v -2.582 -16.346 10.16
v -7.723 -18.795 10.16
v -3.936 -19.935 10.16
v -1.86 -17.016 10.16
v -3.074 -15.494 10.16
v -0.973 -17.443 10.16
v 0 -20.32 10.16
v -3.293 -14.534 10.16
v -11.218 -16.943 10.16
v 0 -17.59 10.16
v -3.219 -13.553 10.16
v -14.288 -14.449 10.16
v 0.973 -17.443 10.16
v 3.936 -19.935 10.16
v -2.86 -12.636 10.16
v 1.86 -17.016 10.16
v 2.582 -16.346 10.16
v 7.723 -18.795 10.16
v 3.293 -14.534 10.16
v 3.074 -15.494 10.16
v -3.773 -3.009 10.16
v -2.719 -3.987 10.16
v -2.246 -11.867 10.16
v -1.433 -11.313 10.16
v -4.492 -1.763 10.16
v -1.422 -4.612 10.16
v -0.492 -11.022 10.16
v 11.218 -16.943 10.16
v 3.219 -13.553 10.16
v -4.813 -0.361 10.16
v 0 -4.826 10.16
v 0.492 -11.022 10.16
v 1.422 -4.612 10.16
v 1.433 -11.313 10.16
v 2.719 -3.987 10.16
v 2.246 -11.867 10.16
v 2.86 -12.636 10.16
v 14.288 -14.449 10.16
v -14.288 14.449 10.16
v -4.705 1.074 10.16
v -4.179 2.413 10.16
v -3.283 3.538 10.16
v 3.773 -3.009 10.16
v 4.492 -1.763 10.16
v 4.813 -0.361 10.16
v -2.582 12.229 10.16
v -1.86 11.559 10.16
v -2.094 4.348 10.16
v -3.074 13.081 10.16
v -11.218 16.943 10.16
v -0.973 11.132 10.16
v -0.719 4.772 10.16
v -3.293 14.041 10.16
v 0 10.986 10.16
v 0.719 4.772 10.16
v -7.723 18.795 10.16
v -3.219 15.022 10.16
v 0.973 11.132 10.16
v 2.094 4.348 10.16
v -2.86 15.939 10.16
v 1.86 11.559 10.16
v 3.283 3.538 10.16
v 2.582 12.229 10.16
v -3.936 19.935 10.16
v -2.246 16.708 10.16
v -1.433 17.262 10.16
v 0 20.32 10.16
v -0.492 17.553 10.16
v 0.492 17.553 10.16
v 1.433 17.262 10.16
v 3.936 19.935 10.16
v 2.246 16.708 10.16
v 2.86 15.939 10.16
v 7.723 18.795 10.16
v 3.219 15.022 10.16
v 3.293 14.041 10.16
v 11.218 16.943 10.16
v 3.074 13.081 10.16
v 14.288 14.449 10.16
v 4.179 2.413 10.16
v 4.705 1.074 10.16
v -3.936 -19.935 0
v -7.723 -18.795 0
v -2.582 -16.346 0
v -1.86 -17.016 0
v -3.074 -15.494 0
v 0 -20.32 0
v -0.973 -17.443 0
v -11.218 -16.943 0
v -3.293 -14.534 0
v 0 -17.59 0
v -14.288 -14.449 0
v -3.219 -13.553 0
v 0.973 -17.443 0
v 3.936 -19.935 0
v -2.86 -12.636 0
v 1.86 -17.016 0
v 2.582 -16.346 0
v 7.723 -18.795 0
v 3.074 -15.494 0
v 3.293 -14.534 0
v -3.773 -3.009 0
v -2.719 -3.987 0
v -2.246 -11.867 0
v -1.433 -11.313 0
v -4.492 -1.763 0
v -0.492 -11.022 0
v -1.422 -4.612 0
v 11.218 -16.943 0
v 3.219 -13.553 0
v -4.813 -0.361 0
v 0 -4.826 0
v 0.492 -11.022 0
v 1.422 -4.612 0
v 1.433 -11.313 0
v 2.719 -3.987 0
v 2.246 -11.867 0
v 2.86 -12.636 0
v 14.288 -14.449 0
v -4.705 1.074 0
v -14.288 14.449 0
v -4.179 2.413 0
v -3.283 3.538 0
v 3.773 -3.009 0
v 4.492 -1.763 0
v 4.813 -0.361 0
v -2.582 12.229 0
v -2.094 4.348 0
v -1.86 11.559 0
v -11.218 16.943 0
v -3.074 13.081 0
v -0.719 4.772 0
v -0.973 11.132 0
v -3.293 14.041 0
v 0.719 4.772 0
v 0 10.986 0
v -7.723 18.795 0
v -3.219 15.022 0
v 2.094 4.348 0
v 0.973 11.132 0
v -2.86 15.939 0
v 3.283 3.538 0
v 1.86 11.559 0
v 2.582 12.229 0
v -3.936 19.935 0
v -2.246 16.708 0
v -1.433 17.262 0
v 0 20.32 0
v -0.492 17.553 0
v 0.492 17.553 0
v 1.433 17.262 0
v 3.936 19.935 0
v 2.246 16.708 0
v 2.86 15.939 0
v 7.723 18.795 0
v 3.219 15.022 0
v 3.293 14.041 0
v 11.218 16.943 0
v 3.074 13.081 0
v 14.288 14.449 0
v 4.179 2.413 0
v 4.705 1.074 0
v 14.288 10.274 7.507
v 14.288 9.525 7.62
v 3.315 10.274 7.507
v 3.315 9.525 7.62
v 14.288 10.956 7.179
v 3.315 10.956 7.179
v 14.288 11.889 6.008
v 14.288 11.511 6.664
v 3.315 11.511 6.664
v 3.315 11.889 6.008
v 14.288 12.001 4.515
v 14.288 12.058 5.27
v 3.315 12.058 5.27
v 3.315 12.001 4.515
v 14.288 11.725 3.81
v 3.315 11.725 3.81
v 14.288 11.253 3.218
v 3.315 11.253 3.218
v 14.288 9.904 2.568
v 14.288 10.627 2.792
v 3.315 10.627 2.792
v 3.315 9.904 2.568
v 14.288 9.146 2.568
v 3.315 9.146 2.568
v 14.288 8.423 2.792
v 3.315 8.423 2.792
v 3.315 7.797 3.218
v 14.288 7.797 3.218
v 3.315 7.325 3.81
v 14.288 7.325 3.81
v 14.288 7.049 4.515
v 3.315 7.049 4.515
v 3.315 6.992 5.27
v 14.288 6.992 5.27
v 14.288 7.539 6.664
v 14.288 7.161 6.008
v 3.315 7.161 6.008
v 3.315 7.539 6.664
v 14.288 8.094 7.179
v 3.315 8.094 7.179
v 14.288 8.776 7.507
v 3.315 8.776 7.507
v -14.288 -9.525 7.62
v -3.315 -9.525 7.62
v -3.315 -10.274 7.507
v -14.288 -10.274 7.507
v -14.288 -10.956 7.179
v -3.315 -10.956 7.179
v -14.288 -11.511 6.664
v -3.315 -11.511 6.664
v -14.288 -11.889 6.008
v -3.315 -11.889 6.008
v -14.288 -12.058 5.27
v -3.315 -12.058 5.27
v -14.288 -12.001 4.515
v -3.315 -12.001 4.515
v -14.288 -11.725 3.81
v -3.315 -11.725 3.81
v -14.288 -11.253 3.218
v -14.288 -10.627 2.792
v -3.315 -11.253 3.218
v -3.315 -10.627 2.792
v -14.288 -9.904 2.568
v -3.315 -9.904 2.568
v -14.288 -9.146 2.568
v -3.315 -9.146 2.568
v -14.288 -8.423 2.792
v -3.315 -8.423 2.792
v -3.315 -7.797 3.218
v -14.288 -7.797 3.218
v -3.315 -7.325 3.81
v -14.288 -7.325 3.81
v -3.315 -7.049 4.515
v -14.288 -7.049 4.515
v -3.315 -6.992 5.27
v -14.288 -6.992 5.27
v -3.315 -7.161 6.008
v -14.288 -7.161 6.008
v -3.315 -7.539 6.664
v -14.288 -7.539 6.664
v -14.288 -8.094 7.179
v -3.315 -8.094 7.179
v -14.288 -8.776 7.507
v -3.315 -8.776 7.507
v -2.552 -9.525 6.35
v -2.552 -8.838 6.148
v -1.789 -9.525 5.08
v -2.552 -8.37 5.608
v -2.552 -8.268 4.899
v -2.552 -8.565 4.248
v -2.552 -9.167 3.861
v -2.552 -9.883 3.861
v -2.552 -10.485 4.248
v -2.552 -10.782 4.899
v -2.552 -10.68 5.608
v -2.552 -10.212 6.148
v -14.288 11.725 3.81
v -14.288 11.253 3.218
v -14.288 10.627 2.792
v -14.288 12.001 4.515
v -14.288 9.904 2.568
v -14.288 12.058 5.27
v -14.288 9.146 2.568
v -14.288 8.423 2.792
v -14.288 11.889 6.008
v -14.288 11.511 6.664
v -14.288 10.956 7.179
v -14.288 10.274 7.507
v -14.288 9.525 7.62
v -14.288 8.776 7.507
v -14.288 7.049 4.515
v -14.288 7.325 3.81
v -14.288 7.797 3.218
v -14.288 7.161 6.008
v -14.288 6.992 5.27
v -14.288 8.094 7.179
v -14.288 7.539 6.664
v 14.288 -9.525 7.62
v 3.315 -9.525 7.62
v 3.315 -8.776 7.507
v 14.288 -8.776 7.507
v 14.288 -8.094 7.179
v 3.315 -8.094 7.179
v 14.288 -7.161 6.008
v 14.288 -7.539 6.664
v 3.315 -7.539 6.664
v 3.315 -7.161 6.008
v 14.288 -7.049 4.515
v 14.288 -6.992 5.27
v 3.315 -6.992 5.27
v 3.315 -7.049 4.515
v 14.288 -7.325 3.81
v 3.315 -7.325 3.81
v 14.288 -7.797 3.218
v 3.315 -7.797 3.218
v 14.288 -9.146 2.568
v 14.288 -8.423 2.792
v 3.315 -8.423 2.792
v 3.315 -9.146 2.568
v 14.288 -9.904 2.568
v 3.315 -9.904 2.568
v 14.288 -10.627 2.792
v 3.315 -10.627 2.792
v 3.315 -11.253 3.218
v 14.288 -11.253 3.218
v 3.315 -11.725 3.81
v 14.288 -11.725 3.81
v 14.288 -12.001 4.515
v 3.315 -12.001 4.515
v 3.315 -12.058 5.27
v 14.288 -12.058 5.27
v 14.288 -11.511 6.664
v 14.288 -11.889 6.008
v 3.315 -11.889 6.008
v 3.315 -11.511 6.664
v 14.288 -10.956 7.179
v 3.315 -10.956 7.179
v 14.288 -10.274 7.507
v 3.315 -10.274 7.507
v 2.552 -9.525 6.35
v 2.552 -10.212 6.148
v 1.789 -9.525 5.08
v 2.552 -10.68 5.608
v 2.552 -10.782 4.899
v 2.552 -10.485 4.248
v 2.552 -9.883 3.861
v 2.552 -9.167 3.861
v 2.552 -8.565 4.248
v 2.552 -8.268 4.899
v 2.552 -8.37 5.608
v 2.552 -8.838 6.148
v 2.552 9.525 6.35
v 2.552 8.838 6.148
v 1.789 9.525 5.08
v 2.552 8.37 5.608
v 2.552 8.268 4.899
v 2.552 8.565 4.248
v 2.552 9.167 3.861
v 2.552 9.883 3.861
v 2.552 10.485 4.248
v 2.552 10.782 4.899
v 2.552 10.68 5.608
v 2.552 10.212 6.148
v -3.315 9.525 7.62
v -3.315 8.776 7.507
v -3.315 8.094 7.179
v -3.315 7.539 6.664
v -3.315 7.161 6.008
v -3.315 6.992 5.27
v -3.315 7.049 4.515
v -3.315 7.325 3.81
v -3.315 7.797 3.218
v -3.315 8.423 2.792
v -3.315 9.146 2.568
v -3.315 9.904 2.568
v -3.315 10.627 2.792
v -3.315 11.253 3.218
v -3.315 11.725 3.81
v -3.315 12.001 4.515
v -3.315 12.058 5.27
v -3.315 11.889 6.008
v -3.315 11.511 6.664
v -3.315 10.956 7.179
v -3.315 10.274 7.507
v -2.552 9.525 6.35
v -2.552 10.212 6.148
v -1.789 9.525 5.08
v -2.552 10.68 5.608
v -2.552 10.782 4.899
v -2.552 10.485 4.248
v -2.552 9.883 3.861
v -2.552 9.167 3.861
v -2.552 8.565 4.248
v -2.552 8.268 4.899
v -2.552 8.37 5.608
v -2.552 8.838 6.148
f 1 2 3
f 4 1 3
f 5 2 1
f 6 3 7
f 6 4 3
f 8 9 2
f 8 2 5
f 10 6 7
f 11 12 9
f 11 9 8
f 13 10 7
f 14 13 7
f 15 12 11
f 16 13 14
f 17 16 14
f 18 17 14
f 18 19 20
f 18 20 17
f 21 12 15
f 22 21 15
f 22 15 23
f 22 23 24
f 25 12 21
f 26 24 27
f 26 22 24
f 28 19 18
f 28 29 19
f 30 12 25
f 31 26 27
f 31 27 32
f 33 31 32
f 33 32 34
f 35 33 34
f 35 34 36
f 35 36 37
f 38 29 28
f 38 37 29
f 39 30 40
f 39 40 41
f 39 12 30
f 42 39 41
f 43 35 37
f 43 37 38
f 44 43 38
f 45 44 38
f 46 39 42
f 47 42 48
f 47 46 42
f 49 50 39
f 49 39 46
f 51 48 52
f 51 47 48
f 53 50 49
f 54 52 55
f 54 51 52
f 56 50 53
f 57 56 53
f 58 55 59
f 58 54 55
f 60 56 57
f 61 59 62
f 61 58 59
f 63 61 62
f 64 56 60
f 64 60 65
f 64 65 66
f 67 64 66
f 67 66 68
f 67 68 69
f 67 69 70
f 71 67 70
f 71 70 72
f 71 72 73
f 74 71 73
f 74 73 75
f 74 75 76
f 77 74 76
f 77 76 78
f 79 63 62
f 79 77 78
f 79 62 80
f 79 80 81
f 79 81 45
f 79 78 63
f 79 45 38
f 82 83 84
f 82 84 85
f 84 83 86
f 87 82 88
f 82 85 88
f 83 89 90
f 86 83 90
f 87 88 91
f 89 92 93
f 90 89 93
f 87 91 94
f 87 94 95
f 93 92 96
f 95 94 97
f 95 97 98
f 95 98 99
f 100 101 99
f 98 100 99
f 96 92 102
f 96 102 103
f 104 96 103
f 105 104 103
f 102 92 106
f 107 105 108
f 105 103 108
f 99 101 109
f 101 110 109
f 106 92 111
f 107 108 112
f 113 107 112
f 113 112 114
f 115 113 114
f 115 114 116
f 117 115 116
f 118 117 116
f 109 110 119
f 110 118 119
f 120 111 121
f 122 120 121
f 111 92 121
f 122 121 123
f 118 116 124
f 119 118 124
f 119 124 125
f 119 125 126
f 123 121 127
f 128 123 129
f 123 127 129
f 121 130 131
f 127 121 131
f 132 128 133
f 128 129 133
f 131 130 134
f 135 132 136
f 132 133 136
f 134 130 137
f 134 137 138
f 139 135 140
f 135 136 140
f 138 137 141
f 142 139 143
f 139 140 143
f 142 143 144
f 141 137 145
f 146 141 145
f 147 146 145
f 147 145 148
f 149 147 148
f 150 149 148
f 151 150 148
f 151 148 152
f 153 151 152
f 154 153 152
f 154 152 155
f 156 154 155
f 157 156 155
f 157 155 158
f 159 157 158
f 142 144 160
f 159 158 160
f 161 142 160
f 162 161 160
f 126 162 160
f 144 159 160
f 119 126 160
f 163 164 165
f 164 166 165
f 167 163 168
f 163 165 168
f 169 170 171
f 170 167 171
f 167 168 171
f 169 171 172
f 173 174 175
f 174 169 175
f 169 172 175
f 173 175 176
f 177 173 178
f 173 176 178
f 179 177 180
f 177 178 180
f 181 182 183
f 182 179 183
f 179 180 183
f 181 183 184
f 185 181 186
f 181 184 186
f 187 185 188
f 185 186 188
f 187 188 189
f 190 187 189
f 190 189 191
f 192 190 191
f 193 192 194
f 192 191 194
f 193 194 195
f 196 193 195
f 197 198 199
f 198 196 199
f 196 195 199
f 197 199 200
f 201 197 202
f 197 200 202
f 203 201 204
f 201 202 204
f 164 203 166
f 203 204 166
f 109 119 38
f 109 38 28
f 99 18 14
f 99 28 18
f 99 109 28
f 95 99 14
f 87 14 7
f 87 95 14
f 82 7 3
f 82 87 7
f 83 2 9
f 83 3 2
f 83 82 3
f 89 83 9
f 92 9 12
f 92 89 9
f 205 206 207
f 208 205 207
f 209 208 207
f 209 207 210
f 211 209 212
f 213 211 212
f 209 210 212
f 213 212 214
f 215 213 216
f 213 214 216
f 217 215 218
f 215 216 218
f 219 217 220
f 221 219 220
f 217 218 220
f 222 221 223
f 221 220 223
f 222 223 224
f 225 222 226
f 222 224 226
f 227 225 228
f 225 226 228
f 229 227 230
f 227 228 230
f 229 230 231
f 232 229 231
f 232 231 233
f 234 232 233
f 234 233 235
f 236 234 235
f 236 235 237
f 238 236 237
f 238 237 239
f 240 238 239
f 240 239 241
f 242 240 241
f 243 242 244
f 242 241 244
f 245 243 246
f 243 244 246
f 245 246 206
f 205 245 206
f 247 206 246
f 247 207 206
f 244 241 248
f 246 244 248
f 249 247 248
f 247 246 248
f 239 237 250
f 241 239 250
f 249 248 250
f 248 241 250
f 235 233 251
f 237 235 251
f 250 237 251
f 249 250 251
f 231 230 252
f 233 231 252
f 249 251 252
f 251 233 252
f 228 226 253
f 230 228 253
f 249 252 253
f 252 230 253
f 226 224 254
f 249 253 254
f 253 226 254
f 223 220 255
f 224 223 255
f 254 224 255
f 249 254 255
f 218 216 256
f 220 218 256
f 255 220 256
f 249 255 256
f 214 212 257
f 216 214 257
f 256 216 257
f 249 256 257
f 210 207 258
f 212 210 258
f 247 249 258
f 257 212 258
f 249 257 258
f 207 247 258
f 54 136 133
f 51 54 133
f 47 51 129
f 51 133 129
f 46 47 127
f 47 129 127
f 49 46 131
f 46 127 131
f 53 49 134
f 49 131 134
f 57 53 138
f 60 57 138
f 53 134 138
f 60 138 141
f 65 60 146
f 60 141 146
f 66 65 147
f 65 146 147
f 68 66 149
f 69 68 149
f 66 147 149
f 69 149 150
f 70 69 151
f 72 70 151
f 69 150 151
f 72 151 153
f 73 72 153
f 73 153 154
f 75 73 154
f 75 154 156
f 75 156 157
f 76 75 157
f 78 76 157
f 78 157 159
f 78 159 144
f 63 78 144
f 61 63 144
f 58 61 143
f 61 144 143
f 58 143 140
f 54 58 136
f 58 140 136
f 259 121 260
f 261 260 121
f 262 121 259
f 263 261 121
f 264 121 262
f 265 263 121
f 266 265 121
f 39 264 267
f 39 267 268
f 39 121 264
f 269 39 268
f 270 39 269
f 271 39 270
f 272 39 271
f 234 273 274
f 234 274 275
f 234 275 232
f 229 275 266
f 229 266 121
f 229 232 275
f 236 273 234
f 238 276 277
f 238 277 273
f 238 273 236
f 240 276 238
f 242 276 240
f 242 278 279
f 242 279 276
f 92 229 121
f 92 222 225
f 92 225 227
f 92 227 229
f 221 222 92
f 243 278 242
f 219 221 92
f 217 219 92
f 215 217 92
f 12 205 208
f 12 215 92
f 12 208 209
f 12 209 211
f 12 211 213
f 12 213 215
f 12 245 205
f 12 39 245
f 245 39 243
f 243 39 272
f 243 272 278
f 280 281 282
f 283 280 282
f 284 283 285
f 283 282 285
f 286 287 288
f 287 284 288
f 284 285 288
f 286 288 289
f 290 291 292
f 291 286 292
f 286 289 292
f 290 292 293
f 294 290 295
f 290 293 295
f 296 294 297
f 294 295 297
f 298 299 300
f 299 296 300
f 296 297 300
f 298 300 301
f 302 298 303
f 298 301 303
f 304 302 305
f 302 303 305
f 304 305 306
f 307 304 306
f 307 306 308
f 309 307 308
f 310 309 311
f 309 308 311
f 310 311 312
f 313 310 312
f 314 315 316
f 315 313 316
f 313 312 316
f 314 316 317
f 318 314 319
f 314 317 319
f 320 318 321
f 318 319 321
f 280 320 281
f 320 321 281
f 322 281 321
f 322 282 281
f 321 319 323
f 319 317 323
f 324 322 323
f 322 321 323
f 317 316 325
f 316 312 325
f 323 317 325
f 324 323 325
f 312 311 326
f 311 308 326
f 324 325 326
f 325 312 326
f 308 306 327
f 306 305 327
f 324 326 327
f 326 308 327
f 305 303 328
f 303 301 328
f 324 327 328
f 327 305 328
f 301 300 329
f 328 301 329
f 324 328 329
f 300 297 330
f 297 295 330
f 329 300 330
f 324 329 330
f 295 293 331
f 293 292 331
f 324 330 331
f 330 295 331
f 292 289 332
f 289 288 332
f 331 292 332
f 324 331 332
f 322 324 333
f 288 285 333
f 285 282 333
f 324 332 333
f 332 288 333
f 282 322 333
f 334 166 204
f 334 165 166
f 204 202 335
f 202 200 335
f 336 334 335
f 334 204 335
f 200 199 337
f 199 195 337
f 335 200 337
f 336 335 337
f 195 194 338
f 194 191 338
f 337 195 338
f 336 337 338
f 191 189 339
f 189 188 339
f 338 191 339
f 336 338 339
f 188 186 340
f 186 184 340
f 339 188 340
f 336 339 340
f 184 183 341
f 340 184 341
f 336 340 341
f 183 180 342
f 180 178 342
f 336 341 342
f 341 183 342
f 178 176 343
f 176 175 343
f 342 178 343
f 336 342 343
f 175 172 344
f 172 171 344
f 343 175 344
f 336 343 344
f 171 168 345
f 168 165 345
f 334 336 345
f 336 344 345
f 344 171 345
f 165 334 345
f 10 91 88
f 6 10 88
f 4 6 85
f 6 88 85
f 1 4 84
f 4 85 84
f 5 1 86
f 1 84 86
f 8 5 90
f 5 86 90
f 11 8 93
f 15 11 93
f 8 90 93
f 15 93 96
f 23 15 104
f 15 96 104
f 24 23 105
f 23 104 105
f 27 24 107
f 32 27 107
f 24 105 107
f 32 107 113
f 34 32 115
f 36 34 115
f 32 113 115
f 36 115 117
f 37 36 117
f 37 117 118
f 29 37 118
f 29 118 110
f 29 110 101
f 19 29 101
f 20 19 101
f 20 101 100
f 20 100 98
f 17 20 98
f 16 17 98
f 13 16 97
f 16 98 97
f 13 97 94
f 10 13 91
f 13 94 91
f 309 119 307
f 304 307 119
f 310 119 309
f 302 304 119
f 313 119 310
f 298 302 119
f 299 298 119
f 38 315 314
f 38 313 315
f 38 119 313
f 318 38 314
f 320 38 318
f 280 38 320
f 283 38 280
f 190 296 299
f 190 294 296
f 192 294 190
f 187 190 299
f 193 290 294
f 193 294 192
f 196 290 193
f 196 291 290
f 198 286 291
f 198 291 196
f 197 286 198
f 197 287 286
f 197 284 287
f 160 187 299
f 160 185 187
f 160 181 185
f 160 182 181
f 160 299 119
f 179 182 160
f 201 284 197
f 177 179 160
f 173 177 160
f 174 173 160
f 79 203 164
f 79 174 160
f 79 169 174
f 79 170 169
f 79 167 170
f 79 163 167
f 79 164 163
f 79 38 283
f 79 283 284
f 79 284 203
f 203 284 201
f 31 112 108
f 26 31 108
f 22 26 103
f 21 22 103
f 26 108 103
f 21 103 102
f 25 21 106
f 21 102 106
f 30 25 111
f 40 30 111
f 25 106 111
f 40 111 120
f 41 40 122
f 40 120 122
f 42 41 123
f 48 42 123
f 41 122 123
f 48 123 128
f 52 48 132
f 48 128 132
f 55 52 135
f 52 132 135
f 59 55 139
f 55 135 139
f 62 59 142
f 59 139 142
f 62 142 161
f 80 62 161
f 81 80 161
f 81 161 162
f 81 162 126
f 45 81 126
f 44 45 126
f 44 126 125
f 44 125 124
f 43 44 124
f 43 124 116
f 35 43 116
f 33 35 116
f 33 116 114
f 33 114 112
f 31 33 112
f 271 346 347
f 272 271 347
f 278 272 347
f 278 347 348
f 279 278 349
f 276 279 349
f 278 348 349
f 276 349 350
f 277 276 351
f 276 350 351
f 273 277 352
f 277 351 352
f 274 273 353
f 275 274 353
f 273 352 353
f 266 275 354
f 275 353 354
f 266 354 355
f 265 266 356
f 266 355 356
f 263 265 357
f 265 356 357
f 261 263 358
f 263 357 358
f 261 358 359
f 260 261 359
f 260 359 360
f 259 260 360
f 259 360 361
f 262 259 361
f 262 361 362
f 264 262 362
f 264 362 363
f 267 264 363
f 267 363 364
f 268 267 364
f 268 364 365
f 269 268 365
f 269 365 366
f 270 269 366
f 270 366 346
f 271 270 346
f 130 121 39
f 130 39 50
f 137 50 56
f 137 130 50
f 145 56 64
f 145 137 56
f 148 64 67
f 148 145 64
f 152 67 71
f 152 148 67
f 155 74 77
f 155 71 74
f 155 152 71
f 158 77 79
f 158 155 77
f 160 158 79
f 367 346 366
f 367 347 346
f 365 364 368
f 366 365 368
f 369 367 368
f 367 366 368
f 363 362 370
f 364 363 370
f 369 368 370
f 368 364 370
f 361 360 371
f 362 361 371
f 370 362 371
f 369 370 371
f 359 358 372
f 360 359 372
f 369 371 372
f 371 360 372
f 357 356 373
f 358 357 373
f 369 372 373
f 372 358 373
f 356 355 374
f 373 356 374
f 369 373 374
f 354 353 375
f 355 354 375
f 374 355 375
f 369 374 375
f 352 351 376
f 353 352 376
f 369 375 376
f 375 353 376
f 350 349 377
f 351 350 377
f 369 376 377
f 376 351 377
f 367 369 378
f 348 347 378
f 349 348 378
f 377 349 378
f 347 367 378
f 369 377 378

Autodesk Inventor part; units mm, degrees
ref_plane "YZ Plane" through (0, 0, 0) normal (1, 0, 0) x (0, 1, 0)
ref_plane "XZ Plane" through (0, 0, 0) normal (0, 1, 0) x (-1, 0, 0)
sketch "Sketch1" plane through (0, 0, 0) normal (0, 0, 1) x (1, 0, 0)
  circle A0 centre (0, 0) radius 20.32
  dimension "d0" = 40.64
extrude "Extrusion1" add sketch "Sketch1" along normal blind 10.16
sketch "Sketch2" plane through (0, 0, 10.16) normal (0, 0, 1) x (1, 0, 0)
  point P0 (0, 0)
  point P1 (0, 0)
hole "Hole1" at (0, 0, 10.16) direction (0, 0, -1) diameter 9.652 depth 10.9728 tip angle 118
sketch "Sketch3" plane through (0, 0, 10.16) normal (0, 0, 1) x (1, 0, 0)
  point P0 (0, 0)
  point P1 (0, 14.2875)
  point P2 (0, -14.2875)
  dimension "d10" = 28.575
  dimension "d11" = 14.2875
hole "Hole2" at (0, 14.2875, 10.16) at (0, -14.2875, 10.16) direction (0, 0, -1) diameter 6.604 depth 10.9728 tip angle 118
sketch "Sketch4" plane through (0, 0, 10.16) normal (0, 0, 1) x (1, 0, 0)
  line L0 (-14.2875, -38.2443) -> (14.2875, -38.2443)
  line L1 (14.2875, -38.2443) -> (14.2875, 37.8114)
  line L2 (14.2875, 37.8114) -> (-14.2875, 37.8114)
  line L3 (-14.2875, 37.8114) -> (-14.2875, -38.2443)
  line L4 (-54.4025, 52.7865) -> (43.8573, 52.7865)
  line L5 (43.8573, 52.7865) -> (43.8573, -66.4941)
  line L6 (43.8573, -66.4941) -> (-54.4025, -66.4941)
  line L7 (-54.4025, -66.4941) -> (-54.4025, 52.7865)
  point P0 (0, 0)
  dimension "d19" = 28.575
  dimension "d20" = 14.2875
extrude "Extrusion2" cut sketch "Sketch4" against normal blind 10.16
sketch "Sketch5" plane through (-14.2875, -14.4489, 10.16) normal (-1, 0, 0) x (0, 0, 1)
  line L0 (0, 0) -> (-10.16, 0) projected
  line L1 (0, 28.8977) -> (0, 0) projected
  line L2 (-10.16, 28.8977) -> (0, 28.8977) projected
  line L3 (-10.16, 0) -> (-10.16, 28.8977) projected
  point P0 (-10.16, 14.4489)
  point P1 (-5.08, 23.9739)
  point P2 (-5.08, 4.9239)
  dimension "d23" = 10.16
  dimension "d24" = 5.08
  dimension "d25" = 5.08
  dimension "d26" = 19.05
  dimension "d27" = 28.8977
  dimension "d28" = 4.9239
hole "Hole3" at (-14.2875, 9.525, 5.08) at (-14.2875, -9.525, 5.08) direction (1, 0, 0) diameter 5.08 depth 10.9728 tip angle 118
ref_plane "Work Plane1" through (0, -14.4489, 10.16) normal (1, 0, 0) x (0, 0, -1)
mirror "Mirror1" about plane through (0, -14.4489, 10.16) normal (1, 0, 0) of "Hole3"
equation "\"d11\" = 0.5 * d10"
equation "\"d20\" = 0.5 * d19"
equation "\"d24\" = 0.5 * d23"
equation "\"d25\" = d24"
equation "\"d28\" = -0.5 * d26 + 0.5 * d27"
